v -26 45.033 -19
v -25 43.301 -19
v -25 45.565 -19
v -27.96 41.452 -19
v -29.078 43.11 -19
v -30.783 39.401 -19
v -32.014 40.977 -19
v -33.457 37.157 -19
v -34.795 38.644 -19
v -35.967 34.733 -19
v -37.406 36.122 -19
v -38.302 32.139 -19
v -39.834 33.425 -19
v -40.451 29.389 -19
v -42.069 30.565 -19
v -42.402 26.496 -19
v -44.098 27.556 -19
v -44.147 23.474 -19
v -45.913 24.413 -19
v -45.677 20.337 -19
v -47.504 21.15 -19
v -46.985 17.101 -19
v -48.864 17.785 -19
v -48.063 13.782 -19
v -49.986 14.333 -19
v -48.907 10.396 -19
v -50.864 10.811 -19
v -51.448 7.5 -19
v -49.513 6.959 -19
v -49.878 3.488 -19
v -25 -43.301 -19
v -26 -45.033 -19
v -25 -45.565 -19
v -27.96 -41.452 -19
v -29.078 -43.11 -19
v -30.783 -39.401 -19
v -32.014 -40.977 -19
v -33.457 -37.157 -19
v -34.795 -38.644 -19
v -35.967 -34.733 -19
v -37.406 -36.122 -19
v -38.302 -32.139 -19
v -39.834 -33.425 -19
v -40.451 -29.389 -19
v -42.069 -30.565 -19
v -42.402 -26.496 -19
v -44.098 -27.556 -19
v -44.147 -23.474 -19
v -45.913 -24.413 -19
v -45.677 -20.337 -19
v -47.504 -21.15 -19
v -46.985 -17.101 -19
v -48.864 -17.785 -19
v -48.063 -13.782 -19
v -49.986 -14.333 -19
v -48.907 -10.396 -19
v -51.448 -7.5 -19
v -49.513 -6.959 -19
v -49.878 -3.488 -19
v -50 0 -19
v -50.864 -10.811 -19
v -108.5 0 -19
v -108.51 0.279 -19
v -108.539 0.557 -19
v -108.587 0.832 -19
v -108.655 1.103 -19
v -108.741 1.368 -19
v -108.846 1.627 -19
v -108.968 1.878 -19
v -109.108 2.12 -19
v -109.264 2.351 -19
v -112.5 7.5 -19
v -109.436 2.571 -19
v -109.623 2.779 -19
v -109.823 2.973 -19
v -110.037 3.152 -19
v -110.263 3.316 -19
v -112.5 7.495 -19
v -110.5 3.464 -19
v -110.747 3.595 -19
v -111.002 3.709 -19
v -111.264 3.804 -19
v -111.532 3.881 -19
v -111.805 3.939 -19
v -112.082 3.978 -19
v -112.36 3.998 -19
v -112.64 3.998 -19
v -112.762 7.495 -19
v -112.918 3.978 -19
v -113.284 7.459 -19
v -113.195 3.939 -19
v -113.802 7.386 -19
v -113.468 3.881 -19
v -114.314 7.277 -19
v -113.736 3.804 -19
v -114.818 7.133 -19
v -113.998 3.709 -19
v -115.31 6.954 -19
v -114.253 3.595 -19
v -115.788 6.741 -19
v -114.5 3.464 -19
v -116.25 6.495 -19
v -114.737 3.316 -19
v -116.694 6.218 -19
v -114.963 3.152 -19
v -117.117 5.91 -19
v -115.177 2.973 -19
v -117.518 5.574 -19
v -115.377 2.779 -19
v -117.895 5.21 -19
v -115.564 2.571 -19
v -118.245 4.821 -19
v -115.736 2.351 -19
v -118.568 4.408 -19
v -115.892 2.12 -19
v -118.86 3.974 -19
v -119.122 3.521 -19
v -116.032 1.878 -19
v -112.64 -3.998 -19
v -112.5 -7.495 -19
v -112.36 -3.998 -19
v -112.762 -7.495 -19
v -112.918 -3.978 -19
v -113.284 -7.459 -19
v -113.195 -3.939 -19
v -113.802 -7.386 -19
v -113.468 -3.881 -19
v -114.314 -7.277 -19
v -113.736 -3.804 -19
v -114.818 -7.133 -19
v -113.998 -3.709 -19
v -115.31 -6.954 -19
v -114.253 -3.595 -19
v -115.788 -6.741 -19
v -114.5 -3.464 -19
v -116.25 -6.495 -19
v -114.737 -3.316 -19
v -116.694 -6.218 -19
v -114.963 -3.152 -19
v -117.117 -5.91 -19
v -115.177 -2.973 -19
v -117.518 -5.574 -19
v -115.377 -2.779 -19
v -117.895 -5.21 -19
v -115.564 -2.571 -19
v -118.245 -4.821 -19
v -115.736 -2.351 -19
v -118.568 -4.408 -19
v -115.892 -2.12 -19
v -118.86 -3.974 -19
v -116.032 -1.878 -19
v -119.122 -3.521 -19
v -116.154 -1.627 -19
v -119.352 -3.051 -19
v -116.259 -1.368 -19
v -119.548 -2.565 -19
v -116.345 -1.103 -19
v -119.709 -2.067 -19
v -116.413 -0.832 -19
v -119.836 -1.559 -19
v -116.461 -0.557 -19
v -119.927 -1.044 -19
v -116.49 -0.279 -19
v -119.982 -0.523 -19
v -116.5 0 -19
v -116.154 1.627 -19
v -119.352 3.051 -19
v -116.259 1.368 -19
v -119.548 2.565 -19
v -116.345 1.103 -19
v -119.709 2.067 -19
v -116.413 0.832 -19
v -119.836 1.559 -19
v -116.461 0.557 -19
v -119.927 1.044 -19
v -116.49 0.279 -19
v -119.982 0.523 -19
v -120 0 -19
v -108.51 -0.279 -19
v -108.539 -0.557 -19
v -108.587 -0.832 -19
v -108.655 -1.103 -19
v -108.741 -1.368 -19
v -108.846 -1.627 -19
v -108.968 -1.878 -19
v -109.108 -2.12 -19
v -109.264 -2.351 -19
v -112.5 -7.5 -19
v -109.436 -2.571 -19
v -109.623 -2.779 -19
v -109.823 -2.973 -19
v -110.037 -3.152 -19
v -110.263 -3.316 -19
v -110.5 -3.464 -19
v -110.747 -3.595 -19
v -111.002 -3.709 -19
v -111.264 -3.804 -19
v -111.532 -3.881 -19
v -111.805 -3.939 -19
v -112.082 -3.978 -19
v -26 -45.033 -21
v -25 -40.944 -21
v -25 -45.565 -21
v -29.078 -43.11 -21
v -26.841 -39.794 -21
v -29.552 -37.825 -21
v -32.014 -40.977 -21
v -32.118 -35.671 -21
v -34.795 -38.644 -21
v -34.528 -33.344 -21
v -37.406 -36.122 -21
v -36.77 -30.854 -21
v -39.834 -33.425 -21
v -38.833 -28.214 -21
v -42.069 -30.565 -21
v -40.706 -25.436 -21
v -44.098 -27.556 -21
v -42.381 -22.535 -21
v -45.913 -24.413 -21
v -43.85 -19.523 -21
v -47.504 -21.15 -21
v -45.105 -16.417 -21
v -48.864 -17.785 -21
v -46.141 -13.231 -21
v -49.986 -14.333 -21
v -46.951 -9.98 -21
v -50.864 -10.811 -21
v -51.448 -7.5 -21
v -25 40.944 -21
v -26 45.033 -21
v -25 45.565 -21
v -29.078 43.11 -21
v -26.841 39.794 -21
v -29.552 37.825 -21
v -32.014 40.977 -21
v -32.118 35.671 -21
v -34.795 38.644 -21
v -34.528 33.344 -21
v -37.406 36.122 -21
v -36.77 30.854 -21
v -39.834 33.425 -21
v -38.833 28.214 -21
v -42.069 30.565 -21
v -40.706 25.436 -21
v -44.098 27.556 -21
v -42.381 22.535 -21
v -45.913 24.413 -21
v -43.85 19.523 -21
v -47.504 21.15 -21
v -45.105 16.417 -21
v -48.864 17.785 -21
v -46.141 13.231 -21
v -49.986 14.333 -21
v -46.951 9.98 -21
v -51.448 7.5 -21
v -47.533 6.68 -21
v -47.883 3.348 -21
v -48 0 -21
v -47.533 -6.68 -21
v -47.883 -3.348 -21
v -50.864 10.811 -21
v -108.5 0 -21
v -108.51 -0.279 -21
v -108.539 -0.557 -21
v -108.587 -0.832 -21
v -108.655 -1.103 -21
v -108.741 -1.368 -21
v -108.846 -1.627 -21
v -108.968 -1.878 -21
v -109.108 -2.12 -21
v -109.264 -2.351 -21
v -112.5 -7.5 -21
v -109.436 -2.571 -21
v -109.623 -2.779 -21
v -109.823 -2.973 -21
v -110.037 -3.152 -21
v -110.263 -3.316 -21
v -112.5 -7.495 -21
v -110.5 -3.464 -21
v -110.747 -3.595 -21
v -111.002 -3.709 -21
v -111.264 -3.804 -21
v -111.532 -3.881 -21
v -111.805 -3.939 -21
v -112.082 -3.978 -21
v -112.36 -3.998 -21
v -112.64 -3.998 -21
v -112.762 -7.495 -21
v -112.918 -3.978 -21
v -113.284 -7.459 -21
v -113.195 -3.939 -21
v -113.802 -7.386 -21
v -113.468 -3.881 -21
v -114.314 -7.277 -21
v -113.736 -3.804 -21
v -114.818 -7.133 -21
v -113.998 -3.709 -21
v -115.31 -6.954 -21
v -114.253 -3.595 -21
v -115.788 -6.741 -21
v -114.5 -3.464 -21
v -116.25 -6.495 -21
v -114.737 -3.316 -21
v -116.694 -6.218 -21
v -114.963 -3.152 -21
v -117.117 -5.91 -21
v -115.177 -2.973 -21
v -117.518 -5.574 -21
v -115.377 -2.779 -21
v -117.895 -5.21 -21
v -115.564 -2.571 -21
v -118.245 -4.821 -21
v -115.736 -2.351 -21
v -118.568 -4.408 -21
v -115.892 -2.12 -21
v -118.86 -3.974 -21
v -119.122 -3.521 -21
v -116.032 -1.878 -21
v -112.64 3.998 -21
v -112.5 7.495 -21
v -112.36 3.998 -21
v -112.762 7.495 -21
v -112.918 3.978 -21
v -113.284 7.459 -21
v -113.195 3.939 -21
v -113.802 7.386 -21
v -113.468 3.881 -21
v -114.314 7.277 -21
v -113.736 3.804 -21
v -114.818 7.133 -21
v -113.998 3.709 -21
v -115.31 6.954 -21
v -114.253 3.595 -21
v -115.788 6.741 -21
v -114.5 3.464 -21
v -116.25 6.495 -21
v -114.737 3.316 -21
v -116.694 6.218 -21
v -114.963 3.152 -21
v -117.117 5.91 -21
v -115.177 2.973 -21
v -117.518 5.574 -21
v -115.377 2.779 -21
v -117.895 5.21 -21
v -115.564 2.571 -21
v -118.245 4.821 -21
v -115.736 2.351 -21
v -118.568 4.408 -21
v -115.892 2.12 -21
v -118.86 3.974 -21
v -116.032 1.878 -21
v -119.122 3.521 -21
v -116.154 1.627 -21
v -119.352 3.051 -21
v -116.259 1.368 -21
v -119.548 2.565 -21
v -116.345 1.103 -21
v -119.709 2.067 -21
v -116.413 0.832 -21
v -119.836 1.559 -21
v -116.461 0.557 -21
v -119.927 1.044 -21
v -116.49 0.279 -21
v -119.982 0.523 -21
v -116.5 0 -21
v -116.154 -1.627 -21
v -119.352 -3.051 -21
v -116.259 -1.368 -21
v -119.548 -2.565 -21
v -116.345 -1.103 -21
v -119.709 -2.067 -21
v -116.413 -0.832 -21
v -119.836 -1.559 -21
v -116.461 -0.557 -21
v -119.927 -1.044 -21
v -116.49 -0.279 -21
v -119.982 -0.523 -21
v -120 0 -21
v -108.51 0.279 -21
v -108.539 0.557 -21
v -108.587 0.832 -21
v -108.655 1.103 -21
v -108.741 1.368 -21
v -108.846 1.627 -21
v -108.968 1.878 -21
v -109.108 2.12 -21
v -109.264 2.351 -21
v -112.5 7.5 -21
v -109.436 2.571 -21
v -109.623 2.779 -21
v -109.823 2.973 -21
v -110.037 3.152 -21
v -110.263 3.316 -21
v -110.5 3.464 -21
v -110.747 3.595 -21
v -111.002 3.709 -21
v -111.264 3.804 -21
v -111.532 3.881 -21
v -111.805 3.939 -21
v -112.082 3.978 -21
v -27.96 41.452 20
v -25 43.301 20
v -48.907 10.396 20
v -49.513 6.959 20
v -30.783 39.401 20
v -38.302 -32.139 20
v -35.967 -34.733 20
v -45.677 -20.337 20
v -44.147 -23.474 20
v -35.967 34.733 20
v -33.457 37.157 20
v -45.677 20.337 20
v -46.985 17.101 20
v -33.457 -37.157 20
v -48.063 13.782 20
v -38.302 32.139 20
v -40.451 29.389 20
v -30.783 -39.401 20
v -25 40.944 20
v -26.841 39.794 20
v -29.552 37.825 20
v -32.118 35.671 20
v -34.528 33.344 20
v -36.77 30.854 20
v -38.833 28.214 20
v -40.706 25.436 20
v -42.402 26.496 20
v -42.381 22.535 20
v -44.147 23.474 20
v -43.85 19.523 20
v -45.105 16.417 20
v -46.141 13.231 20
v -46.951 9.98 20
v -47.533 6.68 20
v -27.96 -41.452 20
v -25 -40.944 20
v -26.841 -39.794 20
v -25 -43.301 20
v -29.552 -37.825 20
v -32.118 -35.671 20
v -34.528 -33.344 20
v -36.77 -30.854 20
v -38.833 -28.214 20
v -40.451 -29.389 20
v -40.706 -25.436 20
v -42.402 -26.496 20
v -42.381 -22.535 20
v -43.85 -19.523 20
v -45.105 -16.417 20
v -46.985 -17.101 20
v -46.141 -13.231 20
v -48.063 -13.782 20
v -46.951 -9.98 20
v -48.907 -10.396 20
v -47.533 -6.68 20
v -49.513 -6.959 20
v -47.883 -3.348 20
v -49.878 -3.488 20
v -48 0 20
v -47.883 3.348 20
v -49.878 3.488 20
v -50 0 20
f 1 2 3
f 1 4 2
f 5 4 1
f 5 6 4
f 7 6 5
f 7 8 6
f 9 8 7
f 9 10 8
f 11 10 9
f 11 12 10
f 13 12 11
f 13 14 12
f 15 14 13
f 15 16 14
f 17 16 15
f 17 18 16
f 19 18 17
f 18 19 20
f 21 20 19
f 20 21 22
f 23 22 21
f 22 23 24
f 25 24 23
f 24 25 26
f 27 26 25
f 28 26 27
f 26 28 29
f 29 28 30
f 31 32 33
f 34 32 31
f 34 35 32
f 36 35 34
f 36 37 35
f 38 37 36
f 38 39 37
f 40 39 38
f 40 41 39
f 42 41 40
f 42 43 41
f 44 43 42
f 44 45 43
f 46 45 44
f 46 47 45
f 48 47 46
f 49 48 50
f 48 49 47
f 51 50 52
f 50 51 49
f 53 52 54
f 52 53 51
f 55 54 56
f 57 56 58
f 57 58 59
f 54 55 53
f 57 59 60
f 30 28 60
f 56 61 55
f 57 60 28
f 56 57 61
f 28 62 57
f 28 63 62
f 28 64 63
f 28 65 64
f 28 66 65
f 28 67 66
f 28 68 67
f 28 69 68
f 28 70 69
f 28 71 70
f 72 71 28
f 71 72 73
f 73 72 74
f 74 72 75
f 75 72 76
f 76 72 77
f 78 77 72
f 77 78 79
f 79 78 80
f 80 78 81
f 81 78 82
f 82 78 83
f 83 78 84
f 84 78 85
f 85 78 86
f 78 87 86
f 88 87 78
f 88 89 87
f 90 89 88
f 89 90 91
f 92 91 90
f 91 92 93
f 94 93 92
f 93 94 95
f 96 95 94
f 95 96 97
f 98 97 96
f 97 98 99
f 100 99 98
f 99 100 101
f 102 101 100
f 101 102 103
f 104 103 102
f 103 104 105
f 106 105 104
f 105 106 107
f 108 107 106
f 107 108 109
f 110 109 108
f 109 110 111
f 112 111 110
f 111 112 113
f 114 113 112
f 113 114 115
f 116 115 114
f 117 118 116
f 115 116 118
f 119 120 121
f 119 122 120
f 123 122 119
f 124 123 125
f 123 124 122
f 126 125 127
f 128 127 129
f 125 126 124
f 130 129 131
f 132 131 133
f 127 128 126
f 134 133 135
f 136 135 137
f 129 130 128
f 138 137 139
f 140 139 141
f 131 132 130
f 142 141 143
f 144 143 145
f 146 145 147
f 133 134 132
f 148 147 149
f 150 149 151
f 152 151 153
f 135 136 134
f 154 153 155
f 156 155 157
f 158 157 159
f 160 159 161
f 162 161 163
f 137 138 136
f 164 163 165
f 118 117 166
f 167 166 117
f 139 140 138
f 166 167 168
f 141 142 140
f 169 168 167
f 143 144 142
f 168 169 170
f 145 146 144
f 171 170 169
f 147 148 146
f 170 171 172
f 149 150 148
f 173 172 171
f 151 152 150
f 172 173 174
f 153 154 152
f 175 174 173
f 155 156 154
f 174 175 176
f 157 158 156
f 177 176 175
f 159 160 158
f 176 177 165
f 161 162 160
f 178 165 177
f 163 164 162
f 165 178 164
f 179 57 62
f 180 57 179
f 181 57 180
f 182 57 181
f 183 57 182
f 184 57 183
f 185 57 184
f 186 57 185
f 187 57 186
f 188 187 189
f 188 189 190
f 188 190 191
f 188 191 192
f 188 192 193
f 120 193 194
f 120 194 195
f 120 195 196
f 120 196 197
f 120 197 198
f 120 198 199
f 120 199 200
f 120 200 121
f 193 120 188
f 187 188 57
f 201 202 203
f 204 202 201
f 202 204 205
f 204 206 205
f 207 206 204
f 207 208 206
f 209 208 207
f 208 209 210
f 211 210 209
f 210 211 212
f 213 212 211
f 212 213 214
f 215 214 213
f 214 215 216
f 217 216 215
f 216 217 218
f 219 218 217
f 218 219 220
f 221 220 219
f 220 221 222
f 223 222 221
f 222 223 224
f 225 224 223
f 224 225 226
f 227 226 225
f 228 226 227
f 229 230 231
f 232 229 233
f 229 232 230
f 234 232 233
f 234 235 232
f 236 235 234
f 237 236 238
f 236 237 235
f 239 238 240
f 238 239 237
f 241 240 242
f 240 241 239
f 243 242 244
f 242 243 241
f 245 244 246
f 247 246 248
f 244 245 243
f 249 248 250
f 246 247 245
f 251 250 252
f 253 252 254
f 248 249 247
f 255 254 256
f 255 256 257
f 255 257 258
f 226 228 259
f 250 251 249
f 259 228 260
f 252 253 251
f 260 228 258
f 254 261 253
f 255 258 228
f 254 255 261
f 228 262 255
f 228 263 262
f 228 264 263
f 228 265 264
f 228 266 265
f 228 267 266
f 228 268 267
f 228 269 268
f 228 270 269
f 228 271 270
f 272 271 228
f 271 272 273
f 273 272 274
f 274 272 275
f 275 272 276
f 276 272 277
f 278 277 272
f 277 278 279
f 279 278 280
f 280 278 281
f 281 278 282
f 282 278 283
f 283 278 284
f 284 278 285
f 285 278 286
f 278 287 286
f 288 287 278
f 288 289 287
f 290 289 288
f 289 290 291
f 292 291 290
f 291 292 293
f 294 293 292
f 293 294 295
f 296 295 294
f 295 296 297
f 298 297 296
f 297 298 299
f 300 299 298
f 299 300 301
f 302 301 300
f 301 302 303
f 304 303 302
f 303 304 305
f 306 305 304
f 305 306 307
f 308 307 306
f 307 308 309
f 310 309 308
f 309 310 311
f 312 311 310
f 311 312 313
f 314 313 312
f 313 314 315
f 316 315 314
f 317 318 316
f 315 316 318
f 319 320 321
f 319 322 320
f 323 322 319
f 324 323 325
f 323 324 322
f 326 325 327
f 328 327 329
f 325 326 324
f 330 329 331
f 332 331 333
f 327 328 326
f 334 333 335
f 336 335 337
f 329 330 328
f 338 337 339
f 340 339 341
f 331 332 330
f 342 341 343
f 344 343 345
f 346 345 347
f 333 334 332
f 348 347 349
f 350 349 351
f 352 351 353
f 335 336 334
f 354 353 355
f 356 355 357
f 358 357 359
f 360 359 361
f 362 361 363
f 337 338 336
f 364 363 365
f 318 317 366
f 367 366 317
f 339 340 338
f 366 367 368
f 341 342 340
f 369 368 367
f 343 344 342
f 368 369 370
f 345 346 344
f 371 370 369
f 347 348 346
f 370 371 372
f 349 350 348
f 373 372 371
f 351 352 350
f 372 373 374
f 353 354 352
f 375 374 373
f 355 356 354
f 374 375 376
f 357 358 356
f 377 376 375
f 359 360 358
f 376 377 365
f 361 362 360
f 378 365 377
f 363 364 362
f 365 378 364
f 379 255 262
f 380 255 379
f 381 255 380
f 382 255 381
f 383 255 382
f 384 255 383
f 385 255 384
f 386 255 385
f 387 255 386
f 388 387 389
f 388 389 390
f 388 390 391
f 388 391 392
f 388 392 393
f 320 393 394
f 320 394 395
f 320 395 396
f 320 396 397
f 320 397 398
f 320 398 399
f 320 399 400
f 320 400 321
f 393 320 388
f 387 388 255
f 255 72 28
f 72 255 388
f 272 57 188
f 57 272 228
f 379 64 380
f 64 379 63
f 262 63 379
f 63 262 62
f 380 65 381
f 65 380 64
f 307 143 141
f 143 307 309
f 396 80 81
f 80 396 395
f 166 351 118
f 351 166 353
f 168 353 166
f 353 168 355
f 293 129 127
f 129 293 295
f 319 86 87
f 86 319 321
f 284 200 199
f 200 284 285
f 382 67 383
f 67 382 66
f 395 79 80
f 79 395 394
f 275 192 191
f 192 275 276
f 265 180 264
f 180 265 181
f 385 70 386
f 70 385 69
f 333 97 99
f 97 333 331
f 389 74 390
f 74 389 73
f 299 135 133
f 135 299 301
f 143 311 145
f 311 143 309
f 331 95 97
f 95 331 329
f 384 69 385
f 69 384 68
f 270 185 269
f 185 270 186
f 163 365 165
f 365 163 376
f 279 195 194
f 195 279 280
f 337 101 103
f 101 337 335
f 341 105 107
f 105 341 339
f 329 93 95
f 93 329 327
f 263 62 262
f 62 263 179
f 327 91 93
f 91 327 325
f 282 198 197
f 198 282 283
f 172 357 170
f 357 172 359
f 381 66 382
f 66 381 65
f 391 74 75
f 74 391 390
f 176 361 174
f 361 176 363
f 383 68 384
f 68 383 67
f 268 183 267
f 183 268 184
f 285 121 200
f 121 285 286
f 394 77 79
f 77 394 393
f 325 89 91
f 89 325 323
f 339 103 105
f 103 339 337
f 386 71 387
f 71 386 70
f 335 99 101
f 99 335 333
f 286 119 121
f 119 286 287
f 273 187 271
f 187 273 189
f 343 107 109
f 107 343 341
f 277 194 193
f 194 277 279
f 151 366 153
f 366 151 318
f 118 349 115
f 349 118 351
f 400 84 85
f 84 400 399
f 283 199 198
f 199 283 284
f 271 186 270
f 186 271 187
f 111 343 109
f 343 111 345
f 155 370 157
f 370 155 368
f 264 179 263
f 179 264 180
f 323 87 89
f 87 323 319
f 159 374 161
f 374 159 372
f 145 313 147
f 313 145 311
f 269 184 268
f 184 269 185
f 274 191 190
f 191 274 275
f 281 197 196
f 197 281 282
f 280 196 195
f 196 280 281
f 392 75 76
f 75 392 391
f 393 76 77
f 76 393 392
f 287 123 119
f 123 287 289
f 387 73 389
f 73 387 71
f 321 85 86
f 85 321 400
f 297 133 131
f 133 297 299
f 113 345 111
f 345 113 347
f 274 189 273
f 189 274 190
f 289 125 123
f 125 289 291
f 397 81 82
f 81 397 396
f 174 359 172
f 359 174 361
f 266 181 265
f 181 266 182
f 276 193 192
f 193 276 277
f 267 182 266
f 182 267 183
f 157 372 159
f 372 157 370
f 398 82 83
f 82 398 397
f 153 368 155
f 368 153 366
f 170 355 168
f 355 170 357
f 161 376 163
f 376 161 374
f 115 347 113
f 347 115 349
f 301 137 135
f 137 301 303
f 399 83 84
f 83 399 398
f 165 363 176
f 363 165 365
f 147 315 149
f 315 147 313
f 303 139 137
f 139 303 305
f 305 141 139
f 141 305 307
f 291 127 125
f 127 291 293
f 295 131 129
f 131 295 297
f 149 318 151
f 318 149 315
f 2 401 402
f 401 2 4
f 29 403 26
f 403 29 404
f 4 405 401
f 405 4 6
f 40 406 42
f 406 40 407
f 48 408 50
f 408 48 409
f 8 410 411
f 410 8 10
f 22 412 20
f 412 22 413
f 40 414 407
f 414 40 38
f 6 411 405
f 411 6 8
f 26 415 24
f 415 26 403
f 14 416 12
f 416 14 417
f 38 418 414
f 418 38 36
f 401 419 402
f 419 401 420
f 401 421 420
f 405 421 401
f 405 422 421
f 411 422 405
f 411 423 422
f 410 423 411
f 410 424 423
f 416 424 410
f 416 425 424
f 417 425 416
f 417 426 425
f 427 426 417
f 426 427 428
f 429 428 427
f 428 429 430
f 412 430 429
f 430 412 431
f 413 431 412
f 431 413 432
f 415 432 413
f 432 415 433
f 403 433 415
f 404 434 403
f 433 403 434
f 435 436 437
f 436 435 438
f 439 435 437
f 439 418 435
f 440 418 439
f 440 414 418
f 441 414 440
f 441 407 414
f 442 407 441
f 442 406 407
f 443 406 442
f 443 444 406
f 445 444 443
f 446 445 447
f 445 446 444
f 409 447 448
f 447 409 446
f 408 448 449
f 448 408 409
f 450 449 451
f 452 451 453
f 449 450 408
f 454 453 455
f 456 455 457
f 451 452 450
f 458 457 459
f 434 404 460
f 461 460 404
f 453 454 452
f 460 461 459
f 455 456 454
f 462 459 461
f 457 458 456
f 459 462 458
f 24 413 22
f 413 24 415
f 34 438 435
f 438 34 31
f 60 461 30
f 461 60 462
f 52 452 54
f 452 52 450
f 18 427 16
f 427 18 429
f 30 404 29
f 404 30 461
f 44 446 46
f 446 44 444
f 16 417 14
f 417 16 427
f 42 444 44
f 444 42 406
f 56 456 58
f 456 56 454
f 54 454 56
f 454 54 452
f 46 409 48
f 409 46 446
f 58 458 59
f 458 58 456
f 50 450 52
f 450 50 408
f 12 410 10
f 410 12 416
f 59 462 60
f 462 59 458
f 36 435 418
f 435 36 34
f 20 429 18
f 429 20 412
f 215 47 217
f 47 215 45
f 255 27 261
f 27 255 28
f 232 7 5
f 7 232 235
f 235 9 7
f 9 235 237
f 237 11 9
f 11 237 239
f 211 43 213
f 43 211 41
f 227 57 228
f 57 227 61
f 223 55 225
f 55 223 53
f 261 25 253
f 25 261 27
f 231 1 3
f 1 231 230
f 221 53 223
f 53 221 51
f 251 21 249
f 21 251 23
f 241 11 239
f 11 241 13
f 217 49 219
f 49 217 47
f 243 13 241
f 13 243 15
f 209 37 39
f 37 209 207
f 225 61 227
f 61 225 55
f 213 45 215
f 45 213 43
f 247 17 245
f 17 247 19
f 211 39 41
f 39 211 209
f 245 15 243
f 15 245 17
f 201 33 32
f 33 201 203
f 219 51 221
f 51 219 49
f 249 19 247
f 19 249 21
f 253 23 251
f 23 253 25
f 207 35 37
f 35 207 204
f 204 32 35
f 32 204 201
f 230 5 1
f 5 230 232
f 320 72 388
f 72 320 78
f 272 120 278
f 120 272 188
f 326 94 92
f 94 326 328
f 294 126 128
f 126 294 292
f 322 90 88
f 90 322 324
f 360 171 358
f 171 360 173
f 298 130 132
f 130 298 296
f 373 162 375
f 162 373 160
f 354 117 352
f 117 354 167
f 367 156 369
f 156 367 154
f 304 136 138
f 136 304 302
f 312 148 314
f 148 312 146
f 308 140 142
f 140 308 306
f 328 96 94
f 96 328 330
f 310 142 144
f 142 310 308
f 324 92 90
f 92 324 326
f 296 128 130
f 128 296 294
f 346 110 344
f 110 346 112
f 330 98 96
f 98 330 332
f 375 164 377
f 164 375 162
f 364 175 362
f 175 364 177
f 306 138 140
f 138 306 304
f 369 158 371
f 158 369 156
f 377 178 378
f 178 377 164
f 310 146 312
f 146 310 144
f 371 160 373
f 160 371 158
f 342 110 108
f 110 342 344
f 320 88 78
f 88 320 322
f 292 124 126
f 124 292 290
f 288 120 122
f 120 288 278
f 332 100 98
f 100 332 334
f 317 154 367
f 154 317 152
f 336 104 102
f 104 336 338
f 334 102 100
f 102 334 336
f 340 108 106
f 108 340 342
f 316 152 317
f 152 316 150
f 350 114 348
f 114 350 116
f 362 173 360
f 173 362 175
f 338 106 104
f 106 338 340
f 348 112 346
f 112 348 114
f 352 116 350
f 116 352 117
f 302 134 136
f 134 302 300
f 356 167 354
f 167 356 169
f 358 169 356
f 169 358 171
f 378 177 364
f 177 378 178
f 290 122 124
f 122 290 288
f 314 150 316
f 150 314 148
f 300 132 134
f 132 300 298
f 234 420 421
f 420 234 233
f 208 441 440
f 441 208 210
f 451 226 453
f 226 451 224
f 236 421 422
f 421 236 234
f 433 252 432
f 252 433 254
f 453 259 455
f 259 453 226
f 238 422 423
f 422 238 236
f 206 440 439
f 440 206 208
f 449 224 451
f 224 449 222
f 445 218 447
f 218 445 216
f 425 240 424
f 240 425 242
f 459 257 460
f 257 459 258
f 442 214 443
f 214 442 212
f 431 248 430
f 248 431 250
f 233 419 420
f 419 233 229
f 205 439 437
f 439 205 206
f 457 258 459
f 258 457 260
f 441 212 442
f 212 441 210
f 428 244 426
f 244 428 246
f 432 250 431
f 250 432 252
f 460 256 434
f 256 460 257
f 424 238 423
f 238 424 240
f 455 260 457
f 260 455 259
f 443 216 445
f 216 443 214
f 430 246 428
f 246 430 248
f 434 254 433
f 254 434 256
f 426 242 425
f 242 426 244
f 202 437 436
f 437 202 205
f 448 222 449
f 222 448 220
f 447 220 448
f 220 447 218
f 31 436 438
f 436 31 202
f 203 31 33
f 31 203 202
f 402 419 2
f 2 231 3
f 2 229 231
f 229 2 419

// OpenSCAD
/*
 * Hat Hook
 *
 * Author: Pavel Rampas
 * Version: 1.0.0 (Changelog is at the bottom)
 * License: CC BY-SA 4.0 [https://creativecommons.org/licenses/by-sa/4.0/]
 * Link: https://github.com/pavelrampas/openscad-models
 *
 * OpenSCAD version: 2019.05
 *
 * Instructions:
 * Set up parameters, render and print.
 *
 * Height is layer.
 * Thickness is perimeter.
 */

// Parameters
//------------------------------------------------------------------------------

$fn = $preview ? 15 : 90;

// circle
circleR = 50; // radius
circleH = 40; // height

// hook
hookH = 2; // height
hookL = 70; //length
hookW = 15; // width

holeR = 4; // radius

// Code
//------------------------------------------------------------------------------

difference() {
    union() {
        cylinder(h = circleH, r = circleR, center = true);
        difference() {
            // hook
            translate([-(circleR + (hookL / 2)) , 0, -((circleH / 2))]) {
                cube([hookL, hookW, hookH], true);
            }
            // hook hole
            translate([
                -(circleR + (hookL - (hookW / 2))),
                0,
                -((circleH / 2))
            ]) {
                cylinder(h = hookH, r = holeR, center = true);
            }
        }
        // circle edge
        translate([0 , 0, -((circleH / 2))]) {
            cylinder(h = hookH, r = (circleR + hookH), center = true);
        }
    }

    // round hook at top
    difference() {
        translate([-(circleR + (hookL - (hookW / 4))), 0, -((circleH / 2))]) {
            cube([(hookW / 2), hookW, hookH], true);
        }
        translate([-(circleR + (hookL - (hookW / 2))), 0, -((circleH / 2))]) {
            cylinder(h = hookH, r = (hookW / 2), center = true);
        }
    }

    // circle
    cylinder(h = (circleH + hookH), r = (circleR - 2), center = true);
    // cut circle with cube
    translate([circleR / 2, 0, 0]) {
        cube([(circleR) * 2, (circleR + hookH) * 3, circleH * 2], true);
    }
}

// Functions
//------------------------------------------------------------------------------


// Modules
//------------------------------------------------------------------------------


// Changelog
//------------------------------------------------------------------------------

// [1.0.0]:
// Initial release.
